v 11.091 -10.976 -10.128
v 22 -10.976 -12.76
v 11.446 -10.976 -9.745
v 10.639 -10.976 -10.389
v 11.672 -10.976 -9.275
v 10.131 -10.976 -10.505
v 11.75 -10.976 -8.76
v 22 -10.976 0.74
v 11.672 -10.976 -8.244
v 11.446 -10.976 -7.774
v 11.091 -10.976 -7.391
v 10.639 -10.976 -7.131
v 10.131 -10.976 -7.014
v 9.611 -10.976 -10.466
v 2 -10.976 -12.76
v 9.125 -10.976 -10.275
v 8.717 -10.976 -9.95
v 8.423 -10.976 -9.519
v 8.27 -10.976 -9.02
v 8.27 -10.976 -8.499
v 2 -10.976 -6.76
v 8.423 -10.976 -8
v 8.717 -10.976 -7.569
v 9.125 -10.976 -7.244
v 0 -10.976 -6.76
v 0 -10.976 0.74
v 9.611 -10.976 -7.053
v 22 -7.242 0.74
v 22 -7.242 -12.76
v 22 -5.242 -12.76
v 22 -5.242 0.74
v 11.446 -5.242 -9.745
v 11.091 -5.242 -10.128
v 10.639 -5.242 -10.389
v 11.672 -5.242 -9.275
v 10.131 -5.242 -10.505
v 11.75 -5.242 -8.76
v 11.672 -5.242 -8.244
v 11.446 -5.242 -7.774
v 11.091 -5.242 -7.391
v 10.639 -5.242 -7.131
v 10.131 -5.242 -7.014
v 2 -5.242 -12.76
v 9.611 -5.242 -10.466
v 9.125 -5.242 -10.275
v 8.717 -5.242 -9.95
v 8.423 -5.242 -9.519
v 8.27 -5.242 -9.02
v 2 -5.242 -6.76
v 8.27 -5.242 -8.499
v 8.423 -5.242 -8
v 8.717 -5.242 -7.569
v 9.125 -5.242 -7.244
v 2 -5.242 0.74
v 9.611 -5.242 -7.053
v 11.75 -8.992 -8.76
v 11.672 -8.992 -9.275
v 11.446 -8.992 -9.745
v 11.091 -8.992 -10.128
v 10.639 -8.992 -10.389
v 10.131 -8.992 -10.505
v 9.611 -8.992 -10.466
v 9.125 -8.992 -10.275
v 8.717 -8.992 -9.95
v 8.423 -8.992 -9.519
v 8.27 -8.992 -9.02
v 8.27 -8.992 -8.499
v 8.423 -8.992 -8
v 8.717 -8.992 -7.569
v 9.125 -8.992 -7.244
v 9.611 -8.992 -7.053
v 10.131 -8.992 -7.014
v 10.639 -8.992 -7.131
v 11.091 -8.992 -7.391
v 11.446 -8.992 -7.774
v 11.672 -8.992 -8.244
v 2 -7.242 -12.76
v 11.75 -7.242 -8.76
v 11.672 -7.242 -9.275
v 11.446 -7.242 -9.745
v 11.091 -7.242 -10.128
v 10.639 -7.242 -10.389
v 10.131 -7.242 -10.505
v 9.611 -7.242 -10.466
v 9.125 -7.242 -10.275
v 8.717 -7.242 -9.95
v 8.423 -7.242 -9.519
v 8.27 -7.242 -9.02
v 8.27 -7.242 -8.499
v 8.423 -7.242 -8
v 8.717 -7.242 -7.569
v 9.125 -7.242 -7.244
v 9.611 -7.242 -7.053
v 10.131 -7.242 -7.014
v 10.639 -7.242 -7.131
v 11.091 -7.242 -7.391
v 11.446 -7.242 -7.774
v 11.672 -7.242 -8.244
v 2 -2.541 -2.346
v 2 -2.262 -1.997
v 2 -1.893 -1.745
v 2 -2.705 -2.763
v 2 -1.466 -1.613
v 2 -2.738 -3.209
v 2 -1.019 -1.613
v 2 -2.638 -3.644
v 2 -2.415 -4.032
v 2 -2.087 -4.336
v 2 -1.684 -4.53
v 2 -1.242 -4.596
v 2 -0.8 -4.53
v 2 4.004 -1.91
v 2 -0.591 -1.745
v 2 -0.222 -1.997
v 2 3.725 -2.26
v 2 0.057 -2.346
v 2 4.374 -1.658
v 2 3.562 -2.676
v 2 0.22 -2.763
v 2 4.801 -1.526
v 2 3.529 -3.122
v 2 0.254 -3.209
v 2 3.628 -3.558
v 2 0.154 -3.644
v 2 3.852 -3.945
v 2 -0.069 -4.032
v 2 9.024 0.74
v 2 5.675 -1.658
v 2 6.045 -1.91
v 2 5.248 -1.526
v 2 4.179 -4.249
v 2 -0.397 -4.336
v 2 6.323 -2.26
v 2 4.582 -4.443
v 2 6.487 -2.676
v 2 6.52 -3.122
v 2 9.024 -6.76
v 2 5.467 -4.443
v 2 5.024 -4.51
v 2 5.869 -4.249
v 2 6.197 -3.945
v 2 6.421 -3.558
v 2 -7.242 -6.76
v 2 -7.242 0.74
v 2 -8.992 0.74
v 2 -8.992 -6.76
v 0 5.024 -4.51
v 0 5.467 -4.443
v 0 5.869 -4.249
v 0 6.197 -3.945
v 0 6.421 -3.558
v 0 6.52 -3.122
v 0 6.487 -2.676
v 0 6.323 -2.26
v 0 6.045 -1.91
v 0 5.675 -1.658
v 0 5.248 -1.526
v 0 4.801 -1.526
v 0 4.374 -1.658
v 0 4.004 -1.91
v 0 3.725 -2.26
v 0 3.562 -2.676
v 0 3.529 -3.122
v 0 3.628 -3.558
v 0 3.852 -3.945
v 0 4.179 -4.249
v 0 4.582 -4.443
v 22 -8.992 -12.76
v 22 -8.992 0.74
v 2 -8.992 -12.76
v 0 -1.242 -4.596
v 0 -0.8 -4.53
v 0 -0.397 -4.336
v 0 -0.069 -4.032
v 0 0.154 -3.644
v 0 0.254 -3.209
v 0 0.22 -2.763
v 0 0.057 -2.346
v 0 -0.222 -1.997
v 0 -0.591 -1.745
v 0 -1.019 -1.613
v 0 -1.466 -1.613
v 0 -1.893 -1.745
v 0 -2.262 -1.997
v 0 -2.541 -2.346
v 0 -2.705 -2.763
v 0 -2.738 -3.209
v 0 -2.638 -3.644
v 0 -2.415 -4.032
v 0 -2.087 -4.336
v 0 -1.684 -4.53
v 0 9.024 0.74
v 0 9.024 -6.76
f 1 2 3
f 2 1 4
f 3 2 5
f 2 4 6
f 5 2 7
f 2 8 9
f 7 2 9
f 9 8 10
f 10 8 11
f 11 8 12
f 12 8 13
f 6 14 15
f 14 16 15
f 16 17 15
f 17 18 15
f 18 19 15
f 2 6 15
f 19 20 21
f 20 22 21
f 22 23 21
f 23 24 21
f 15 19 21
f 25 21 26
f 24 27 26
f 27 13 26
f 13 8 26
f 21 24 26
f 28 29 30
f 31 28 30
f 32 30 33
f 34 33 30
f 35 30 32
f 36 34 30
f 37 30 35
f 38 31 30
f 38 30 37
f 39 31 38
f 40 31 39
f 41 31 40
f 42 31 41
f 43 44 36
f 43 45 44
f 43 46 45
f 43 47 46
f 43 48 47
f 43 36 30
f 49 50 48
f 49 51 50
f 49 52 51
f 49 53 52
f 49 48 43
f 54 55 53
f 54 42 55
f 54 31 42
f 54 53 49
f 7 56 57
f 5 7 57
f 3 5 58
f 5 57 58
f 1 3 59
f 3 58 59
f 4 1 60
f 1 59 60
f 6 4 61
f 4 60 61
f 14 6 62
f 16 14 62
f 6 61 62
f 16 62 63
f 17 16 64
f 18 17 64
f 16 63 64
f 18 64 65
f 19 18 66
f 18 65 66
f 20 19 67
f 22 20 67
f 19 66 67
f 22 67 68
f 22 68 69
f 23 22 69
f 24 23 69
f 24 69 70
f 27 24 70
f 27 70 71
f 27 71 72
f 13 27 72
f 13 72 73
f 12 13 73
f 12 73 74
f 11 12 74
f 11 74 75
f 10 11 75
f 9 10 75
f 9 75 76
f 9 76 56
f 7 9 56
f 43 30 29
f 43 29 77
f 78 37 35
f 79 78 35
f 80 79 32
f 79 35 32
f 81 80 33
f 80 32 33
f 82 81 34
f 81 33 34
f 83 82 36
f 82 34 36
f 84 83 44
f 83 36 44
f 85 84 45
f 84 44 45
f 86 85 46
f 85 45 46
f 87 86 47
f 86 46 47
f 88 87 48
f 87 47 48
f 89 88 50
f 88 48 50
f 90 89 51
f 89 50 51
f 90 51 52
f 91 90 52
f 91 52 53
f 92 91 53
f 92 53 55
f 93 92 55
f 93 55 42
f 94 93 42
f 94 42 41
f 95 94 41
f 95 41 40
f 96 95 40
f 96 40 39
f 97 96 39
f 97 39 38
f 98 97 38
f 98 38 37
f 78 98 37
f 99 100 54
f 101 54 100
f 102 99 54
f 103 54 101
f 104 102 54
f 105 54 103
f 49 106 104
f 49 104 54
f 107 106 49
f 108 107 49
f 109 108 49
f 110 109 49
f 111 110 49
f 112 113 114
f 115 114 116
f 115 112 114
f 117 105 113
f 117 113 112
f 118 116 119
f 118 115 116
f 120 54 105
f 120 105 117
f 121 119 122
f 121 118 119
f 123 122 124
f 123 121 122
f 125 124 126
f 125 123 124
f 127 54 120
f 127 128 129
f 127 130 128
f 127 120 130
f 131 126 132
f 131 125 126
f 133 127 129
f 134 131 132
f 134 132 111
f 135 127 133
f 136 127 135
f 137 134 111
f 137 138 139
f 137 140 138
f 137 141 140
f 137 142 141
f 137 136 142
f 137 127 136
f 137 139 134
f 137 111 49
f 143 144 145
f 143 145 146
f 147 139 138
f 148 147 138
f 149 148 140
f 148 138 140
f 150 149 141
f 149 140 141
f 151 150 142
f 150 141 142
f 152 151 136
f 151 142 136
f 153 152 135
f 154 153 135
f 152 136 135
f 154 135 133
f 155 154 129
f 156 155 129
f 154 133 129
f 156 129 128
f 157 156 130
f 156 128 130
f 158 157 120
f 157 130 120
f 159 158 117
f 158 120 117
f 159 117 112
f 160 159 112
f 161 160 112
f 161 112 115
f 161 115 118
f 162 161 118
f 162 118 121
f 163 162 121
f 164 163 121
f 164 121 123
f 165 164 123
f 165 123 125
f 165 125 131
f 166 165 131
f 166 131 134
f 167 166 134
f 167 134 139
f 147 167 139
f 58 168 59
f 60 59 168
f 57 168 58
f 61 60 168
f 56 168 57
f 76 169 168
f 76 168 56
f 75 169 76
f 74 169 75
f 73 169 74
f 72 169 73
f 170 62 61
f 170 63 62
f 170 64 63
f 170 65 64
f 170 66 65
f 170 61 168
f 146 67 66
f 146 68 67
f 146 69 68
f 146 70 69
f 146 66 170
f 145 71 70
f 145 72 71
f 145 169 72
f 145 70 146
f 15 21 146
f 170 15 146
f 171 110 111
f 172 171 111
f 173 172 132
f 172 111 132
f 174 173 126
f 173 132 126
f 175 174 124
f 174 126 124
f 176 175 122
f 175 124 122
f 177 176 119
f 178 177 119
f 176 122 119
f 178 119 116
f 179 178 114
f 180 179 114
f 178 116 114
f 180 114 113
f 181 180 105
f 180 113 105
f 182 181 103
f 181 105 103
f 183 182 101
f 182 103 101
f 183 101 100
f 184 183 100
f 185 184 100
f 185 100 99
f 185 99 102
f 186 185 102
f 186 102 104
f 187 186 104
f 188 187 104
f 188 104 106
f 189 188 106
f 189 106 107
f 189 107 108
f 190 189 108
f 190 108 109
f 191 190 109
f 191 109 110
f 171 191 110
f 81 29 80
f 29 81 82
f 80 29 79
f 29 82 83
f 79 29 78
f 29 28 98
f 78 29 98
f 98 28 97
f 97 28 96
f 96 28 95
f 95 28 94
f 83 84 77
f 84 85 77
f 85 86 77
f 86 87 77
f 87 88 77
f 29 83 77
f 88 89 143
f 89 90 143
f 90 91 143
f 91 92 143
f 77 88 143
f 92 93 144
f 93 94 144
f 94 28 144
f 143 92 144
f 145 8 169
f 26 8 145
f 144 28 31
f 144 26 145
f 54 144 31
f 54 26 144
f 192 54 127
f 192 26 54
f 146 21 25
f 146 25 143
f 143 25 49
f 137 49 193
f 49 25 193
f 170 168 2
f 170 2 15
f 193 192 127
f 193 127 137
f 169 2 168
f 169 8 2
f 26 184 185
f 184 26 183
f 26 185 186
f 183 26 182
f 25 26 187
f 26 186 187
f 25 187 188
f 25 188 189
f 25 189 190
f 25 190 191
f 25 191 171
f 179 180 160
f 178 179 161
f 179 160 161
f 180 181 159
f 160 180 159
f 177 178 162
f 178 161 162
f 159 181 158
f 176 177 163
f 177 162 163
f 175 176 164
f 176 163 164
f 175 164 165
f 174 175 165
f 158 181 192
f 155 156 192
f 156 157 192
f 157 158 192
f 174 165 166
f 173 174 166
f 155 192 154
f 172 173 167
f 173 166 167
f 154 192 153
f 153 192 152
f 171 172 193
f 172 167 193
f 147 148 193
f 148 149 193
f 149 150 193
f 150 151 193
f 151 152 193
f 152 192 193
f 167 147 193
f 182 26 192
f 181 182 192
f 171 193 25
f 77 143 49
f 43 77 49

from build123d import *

# Parameters (mm, degrees)
SKETCH1_W           = 7.5
SKETCH1_H           = 20
BOSS_EXTRUDE2_DEPTH = 2
SKETCH2_W           = 7.5
SKETCH2_H           = 1.98347932
BOSS_EXTRUDE3_DEPTH = 20
SKETCH3_W           = 7.5
SKETCH3_H           = 2
BOSS_EXTRUDE4_DEPTH = 20
SKETCH5_R           = 1.5
CUT_EXTRUDE1_DEPTH  = 20
SKETCH7_W           = 20
SKETCH7_H           = 2
BOSS_EXTRUDE6_DEPTH = 6
SKETCH8_W           = 20
SKETCH8_H           = 1.98347932
BOSS_EXTRUDE7_DEPTH = 6
SKETCH9_R           = 1.75
CUT_EXTRUDE2_DEPTH  = 6


with BuildPart() as part:
    # Sketch1 → Boss-Extrude2 (new body)
    with BuildSketch(Plane(origin=(0, 0, 0), x_dir=(0, 0, -1), z_dir=(1, 0, 0))):
        with Locations((3.009581882, -0.975609756)):
            Rectangle(SKETCH1_W, SKETCH1_H)
    extrude(amount=BOSS_EXTRUDE2_DEPTH)

    # Sketch2 → Boss-Extrude3 (add)
    with BuildSketch(Plane(origin=(2, 0, 0), x_dir=(0, 0, -1), z_dir=(1, 0, 0))):
        with Locations((3.009581882, -9.983870096)):
            Rectangle(SKETCH2_W, SKETCH2_H)
    extrude(amount=BOSS_EXTRUDE3_DEPTH)

    # Sketch3 → Boss-Extrude4 (add)
    with BuildSketch(Plane(origin=(2, 0, 0), x_dir=(0, 0, -1), z_dir=(1, 0, 0))):
        with Locations((3.009581882, -6.242130436)):
            Rectangle(SKETCH3_W, SKETCH3_H)
    extrude(amount=BOSS_EXTRUDE4_DEPTH)

    # Sketch5 → Cut-Extrude1 (cut)
    with BuildSketch(Plane(origin=(2, 0, 0), x_dir=(0, 0, -1), z_dir=(1, 0, 0))):
        with Locations((3.009581882, 5.024390244)):
            Circle(SKETCH5_R)
        with Locations((3.096458319, -1.242130436)):
            Circle(SKETCH5_R)
    extrude(amount=-CUT_EXTRUDE1_DEPTH, mode=Mode.SUBTRACT)

    # Sketch7 → Boss-Extrude6 (add)
    with BuildSketch(Plane(origin=(0, 0, -6.759581882), x_dir=(-1, 0, 0), z_dir=(0, 0, -1))):
        with Locations((-12, -6.242130436)):
            Rectangle(SKETCH7_W, SKETCH7_H)
    extrude(amount=BOSS_EXTRUDE6_DEPTH)

    # Sketch8 → Boss-Extrude7 (add)
    with BuildSketch(Plane(origin=(0, 0, -6.759581882), x_dir=(-1, 0, 0), z_dir=(0, 0, -1))):
        with Locations((-12, -9.983870096)):
            Rectangle(SKETCH8_W, SKETCH8_H)
    extrude(amount=BOSS_EXTRUDE7_DEPTH)

    # Sketch9 → Cut-Extrude2 (cut)
    with BuildSketch(Plane(origin=(0, -5.242130436, 0), x_dir=(1, 0, 0), z_dir=(0, 1, 0))):
        with Locations((10, 8.759581882)):
            Circle(SKETCH9_R)
    extrude(amount=-CUT_EXTRUDE2_DEPTH, mode=Mode.SUBTRACT)


solid = part.part
